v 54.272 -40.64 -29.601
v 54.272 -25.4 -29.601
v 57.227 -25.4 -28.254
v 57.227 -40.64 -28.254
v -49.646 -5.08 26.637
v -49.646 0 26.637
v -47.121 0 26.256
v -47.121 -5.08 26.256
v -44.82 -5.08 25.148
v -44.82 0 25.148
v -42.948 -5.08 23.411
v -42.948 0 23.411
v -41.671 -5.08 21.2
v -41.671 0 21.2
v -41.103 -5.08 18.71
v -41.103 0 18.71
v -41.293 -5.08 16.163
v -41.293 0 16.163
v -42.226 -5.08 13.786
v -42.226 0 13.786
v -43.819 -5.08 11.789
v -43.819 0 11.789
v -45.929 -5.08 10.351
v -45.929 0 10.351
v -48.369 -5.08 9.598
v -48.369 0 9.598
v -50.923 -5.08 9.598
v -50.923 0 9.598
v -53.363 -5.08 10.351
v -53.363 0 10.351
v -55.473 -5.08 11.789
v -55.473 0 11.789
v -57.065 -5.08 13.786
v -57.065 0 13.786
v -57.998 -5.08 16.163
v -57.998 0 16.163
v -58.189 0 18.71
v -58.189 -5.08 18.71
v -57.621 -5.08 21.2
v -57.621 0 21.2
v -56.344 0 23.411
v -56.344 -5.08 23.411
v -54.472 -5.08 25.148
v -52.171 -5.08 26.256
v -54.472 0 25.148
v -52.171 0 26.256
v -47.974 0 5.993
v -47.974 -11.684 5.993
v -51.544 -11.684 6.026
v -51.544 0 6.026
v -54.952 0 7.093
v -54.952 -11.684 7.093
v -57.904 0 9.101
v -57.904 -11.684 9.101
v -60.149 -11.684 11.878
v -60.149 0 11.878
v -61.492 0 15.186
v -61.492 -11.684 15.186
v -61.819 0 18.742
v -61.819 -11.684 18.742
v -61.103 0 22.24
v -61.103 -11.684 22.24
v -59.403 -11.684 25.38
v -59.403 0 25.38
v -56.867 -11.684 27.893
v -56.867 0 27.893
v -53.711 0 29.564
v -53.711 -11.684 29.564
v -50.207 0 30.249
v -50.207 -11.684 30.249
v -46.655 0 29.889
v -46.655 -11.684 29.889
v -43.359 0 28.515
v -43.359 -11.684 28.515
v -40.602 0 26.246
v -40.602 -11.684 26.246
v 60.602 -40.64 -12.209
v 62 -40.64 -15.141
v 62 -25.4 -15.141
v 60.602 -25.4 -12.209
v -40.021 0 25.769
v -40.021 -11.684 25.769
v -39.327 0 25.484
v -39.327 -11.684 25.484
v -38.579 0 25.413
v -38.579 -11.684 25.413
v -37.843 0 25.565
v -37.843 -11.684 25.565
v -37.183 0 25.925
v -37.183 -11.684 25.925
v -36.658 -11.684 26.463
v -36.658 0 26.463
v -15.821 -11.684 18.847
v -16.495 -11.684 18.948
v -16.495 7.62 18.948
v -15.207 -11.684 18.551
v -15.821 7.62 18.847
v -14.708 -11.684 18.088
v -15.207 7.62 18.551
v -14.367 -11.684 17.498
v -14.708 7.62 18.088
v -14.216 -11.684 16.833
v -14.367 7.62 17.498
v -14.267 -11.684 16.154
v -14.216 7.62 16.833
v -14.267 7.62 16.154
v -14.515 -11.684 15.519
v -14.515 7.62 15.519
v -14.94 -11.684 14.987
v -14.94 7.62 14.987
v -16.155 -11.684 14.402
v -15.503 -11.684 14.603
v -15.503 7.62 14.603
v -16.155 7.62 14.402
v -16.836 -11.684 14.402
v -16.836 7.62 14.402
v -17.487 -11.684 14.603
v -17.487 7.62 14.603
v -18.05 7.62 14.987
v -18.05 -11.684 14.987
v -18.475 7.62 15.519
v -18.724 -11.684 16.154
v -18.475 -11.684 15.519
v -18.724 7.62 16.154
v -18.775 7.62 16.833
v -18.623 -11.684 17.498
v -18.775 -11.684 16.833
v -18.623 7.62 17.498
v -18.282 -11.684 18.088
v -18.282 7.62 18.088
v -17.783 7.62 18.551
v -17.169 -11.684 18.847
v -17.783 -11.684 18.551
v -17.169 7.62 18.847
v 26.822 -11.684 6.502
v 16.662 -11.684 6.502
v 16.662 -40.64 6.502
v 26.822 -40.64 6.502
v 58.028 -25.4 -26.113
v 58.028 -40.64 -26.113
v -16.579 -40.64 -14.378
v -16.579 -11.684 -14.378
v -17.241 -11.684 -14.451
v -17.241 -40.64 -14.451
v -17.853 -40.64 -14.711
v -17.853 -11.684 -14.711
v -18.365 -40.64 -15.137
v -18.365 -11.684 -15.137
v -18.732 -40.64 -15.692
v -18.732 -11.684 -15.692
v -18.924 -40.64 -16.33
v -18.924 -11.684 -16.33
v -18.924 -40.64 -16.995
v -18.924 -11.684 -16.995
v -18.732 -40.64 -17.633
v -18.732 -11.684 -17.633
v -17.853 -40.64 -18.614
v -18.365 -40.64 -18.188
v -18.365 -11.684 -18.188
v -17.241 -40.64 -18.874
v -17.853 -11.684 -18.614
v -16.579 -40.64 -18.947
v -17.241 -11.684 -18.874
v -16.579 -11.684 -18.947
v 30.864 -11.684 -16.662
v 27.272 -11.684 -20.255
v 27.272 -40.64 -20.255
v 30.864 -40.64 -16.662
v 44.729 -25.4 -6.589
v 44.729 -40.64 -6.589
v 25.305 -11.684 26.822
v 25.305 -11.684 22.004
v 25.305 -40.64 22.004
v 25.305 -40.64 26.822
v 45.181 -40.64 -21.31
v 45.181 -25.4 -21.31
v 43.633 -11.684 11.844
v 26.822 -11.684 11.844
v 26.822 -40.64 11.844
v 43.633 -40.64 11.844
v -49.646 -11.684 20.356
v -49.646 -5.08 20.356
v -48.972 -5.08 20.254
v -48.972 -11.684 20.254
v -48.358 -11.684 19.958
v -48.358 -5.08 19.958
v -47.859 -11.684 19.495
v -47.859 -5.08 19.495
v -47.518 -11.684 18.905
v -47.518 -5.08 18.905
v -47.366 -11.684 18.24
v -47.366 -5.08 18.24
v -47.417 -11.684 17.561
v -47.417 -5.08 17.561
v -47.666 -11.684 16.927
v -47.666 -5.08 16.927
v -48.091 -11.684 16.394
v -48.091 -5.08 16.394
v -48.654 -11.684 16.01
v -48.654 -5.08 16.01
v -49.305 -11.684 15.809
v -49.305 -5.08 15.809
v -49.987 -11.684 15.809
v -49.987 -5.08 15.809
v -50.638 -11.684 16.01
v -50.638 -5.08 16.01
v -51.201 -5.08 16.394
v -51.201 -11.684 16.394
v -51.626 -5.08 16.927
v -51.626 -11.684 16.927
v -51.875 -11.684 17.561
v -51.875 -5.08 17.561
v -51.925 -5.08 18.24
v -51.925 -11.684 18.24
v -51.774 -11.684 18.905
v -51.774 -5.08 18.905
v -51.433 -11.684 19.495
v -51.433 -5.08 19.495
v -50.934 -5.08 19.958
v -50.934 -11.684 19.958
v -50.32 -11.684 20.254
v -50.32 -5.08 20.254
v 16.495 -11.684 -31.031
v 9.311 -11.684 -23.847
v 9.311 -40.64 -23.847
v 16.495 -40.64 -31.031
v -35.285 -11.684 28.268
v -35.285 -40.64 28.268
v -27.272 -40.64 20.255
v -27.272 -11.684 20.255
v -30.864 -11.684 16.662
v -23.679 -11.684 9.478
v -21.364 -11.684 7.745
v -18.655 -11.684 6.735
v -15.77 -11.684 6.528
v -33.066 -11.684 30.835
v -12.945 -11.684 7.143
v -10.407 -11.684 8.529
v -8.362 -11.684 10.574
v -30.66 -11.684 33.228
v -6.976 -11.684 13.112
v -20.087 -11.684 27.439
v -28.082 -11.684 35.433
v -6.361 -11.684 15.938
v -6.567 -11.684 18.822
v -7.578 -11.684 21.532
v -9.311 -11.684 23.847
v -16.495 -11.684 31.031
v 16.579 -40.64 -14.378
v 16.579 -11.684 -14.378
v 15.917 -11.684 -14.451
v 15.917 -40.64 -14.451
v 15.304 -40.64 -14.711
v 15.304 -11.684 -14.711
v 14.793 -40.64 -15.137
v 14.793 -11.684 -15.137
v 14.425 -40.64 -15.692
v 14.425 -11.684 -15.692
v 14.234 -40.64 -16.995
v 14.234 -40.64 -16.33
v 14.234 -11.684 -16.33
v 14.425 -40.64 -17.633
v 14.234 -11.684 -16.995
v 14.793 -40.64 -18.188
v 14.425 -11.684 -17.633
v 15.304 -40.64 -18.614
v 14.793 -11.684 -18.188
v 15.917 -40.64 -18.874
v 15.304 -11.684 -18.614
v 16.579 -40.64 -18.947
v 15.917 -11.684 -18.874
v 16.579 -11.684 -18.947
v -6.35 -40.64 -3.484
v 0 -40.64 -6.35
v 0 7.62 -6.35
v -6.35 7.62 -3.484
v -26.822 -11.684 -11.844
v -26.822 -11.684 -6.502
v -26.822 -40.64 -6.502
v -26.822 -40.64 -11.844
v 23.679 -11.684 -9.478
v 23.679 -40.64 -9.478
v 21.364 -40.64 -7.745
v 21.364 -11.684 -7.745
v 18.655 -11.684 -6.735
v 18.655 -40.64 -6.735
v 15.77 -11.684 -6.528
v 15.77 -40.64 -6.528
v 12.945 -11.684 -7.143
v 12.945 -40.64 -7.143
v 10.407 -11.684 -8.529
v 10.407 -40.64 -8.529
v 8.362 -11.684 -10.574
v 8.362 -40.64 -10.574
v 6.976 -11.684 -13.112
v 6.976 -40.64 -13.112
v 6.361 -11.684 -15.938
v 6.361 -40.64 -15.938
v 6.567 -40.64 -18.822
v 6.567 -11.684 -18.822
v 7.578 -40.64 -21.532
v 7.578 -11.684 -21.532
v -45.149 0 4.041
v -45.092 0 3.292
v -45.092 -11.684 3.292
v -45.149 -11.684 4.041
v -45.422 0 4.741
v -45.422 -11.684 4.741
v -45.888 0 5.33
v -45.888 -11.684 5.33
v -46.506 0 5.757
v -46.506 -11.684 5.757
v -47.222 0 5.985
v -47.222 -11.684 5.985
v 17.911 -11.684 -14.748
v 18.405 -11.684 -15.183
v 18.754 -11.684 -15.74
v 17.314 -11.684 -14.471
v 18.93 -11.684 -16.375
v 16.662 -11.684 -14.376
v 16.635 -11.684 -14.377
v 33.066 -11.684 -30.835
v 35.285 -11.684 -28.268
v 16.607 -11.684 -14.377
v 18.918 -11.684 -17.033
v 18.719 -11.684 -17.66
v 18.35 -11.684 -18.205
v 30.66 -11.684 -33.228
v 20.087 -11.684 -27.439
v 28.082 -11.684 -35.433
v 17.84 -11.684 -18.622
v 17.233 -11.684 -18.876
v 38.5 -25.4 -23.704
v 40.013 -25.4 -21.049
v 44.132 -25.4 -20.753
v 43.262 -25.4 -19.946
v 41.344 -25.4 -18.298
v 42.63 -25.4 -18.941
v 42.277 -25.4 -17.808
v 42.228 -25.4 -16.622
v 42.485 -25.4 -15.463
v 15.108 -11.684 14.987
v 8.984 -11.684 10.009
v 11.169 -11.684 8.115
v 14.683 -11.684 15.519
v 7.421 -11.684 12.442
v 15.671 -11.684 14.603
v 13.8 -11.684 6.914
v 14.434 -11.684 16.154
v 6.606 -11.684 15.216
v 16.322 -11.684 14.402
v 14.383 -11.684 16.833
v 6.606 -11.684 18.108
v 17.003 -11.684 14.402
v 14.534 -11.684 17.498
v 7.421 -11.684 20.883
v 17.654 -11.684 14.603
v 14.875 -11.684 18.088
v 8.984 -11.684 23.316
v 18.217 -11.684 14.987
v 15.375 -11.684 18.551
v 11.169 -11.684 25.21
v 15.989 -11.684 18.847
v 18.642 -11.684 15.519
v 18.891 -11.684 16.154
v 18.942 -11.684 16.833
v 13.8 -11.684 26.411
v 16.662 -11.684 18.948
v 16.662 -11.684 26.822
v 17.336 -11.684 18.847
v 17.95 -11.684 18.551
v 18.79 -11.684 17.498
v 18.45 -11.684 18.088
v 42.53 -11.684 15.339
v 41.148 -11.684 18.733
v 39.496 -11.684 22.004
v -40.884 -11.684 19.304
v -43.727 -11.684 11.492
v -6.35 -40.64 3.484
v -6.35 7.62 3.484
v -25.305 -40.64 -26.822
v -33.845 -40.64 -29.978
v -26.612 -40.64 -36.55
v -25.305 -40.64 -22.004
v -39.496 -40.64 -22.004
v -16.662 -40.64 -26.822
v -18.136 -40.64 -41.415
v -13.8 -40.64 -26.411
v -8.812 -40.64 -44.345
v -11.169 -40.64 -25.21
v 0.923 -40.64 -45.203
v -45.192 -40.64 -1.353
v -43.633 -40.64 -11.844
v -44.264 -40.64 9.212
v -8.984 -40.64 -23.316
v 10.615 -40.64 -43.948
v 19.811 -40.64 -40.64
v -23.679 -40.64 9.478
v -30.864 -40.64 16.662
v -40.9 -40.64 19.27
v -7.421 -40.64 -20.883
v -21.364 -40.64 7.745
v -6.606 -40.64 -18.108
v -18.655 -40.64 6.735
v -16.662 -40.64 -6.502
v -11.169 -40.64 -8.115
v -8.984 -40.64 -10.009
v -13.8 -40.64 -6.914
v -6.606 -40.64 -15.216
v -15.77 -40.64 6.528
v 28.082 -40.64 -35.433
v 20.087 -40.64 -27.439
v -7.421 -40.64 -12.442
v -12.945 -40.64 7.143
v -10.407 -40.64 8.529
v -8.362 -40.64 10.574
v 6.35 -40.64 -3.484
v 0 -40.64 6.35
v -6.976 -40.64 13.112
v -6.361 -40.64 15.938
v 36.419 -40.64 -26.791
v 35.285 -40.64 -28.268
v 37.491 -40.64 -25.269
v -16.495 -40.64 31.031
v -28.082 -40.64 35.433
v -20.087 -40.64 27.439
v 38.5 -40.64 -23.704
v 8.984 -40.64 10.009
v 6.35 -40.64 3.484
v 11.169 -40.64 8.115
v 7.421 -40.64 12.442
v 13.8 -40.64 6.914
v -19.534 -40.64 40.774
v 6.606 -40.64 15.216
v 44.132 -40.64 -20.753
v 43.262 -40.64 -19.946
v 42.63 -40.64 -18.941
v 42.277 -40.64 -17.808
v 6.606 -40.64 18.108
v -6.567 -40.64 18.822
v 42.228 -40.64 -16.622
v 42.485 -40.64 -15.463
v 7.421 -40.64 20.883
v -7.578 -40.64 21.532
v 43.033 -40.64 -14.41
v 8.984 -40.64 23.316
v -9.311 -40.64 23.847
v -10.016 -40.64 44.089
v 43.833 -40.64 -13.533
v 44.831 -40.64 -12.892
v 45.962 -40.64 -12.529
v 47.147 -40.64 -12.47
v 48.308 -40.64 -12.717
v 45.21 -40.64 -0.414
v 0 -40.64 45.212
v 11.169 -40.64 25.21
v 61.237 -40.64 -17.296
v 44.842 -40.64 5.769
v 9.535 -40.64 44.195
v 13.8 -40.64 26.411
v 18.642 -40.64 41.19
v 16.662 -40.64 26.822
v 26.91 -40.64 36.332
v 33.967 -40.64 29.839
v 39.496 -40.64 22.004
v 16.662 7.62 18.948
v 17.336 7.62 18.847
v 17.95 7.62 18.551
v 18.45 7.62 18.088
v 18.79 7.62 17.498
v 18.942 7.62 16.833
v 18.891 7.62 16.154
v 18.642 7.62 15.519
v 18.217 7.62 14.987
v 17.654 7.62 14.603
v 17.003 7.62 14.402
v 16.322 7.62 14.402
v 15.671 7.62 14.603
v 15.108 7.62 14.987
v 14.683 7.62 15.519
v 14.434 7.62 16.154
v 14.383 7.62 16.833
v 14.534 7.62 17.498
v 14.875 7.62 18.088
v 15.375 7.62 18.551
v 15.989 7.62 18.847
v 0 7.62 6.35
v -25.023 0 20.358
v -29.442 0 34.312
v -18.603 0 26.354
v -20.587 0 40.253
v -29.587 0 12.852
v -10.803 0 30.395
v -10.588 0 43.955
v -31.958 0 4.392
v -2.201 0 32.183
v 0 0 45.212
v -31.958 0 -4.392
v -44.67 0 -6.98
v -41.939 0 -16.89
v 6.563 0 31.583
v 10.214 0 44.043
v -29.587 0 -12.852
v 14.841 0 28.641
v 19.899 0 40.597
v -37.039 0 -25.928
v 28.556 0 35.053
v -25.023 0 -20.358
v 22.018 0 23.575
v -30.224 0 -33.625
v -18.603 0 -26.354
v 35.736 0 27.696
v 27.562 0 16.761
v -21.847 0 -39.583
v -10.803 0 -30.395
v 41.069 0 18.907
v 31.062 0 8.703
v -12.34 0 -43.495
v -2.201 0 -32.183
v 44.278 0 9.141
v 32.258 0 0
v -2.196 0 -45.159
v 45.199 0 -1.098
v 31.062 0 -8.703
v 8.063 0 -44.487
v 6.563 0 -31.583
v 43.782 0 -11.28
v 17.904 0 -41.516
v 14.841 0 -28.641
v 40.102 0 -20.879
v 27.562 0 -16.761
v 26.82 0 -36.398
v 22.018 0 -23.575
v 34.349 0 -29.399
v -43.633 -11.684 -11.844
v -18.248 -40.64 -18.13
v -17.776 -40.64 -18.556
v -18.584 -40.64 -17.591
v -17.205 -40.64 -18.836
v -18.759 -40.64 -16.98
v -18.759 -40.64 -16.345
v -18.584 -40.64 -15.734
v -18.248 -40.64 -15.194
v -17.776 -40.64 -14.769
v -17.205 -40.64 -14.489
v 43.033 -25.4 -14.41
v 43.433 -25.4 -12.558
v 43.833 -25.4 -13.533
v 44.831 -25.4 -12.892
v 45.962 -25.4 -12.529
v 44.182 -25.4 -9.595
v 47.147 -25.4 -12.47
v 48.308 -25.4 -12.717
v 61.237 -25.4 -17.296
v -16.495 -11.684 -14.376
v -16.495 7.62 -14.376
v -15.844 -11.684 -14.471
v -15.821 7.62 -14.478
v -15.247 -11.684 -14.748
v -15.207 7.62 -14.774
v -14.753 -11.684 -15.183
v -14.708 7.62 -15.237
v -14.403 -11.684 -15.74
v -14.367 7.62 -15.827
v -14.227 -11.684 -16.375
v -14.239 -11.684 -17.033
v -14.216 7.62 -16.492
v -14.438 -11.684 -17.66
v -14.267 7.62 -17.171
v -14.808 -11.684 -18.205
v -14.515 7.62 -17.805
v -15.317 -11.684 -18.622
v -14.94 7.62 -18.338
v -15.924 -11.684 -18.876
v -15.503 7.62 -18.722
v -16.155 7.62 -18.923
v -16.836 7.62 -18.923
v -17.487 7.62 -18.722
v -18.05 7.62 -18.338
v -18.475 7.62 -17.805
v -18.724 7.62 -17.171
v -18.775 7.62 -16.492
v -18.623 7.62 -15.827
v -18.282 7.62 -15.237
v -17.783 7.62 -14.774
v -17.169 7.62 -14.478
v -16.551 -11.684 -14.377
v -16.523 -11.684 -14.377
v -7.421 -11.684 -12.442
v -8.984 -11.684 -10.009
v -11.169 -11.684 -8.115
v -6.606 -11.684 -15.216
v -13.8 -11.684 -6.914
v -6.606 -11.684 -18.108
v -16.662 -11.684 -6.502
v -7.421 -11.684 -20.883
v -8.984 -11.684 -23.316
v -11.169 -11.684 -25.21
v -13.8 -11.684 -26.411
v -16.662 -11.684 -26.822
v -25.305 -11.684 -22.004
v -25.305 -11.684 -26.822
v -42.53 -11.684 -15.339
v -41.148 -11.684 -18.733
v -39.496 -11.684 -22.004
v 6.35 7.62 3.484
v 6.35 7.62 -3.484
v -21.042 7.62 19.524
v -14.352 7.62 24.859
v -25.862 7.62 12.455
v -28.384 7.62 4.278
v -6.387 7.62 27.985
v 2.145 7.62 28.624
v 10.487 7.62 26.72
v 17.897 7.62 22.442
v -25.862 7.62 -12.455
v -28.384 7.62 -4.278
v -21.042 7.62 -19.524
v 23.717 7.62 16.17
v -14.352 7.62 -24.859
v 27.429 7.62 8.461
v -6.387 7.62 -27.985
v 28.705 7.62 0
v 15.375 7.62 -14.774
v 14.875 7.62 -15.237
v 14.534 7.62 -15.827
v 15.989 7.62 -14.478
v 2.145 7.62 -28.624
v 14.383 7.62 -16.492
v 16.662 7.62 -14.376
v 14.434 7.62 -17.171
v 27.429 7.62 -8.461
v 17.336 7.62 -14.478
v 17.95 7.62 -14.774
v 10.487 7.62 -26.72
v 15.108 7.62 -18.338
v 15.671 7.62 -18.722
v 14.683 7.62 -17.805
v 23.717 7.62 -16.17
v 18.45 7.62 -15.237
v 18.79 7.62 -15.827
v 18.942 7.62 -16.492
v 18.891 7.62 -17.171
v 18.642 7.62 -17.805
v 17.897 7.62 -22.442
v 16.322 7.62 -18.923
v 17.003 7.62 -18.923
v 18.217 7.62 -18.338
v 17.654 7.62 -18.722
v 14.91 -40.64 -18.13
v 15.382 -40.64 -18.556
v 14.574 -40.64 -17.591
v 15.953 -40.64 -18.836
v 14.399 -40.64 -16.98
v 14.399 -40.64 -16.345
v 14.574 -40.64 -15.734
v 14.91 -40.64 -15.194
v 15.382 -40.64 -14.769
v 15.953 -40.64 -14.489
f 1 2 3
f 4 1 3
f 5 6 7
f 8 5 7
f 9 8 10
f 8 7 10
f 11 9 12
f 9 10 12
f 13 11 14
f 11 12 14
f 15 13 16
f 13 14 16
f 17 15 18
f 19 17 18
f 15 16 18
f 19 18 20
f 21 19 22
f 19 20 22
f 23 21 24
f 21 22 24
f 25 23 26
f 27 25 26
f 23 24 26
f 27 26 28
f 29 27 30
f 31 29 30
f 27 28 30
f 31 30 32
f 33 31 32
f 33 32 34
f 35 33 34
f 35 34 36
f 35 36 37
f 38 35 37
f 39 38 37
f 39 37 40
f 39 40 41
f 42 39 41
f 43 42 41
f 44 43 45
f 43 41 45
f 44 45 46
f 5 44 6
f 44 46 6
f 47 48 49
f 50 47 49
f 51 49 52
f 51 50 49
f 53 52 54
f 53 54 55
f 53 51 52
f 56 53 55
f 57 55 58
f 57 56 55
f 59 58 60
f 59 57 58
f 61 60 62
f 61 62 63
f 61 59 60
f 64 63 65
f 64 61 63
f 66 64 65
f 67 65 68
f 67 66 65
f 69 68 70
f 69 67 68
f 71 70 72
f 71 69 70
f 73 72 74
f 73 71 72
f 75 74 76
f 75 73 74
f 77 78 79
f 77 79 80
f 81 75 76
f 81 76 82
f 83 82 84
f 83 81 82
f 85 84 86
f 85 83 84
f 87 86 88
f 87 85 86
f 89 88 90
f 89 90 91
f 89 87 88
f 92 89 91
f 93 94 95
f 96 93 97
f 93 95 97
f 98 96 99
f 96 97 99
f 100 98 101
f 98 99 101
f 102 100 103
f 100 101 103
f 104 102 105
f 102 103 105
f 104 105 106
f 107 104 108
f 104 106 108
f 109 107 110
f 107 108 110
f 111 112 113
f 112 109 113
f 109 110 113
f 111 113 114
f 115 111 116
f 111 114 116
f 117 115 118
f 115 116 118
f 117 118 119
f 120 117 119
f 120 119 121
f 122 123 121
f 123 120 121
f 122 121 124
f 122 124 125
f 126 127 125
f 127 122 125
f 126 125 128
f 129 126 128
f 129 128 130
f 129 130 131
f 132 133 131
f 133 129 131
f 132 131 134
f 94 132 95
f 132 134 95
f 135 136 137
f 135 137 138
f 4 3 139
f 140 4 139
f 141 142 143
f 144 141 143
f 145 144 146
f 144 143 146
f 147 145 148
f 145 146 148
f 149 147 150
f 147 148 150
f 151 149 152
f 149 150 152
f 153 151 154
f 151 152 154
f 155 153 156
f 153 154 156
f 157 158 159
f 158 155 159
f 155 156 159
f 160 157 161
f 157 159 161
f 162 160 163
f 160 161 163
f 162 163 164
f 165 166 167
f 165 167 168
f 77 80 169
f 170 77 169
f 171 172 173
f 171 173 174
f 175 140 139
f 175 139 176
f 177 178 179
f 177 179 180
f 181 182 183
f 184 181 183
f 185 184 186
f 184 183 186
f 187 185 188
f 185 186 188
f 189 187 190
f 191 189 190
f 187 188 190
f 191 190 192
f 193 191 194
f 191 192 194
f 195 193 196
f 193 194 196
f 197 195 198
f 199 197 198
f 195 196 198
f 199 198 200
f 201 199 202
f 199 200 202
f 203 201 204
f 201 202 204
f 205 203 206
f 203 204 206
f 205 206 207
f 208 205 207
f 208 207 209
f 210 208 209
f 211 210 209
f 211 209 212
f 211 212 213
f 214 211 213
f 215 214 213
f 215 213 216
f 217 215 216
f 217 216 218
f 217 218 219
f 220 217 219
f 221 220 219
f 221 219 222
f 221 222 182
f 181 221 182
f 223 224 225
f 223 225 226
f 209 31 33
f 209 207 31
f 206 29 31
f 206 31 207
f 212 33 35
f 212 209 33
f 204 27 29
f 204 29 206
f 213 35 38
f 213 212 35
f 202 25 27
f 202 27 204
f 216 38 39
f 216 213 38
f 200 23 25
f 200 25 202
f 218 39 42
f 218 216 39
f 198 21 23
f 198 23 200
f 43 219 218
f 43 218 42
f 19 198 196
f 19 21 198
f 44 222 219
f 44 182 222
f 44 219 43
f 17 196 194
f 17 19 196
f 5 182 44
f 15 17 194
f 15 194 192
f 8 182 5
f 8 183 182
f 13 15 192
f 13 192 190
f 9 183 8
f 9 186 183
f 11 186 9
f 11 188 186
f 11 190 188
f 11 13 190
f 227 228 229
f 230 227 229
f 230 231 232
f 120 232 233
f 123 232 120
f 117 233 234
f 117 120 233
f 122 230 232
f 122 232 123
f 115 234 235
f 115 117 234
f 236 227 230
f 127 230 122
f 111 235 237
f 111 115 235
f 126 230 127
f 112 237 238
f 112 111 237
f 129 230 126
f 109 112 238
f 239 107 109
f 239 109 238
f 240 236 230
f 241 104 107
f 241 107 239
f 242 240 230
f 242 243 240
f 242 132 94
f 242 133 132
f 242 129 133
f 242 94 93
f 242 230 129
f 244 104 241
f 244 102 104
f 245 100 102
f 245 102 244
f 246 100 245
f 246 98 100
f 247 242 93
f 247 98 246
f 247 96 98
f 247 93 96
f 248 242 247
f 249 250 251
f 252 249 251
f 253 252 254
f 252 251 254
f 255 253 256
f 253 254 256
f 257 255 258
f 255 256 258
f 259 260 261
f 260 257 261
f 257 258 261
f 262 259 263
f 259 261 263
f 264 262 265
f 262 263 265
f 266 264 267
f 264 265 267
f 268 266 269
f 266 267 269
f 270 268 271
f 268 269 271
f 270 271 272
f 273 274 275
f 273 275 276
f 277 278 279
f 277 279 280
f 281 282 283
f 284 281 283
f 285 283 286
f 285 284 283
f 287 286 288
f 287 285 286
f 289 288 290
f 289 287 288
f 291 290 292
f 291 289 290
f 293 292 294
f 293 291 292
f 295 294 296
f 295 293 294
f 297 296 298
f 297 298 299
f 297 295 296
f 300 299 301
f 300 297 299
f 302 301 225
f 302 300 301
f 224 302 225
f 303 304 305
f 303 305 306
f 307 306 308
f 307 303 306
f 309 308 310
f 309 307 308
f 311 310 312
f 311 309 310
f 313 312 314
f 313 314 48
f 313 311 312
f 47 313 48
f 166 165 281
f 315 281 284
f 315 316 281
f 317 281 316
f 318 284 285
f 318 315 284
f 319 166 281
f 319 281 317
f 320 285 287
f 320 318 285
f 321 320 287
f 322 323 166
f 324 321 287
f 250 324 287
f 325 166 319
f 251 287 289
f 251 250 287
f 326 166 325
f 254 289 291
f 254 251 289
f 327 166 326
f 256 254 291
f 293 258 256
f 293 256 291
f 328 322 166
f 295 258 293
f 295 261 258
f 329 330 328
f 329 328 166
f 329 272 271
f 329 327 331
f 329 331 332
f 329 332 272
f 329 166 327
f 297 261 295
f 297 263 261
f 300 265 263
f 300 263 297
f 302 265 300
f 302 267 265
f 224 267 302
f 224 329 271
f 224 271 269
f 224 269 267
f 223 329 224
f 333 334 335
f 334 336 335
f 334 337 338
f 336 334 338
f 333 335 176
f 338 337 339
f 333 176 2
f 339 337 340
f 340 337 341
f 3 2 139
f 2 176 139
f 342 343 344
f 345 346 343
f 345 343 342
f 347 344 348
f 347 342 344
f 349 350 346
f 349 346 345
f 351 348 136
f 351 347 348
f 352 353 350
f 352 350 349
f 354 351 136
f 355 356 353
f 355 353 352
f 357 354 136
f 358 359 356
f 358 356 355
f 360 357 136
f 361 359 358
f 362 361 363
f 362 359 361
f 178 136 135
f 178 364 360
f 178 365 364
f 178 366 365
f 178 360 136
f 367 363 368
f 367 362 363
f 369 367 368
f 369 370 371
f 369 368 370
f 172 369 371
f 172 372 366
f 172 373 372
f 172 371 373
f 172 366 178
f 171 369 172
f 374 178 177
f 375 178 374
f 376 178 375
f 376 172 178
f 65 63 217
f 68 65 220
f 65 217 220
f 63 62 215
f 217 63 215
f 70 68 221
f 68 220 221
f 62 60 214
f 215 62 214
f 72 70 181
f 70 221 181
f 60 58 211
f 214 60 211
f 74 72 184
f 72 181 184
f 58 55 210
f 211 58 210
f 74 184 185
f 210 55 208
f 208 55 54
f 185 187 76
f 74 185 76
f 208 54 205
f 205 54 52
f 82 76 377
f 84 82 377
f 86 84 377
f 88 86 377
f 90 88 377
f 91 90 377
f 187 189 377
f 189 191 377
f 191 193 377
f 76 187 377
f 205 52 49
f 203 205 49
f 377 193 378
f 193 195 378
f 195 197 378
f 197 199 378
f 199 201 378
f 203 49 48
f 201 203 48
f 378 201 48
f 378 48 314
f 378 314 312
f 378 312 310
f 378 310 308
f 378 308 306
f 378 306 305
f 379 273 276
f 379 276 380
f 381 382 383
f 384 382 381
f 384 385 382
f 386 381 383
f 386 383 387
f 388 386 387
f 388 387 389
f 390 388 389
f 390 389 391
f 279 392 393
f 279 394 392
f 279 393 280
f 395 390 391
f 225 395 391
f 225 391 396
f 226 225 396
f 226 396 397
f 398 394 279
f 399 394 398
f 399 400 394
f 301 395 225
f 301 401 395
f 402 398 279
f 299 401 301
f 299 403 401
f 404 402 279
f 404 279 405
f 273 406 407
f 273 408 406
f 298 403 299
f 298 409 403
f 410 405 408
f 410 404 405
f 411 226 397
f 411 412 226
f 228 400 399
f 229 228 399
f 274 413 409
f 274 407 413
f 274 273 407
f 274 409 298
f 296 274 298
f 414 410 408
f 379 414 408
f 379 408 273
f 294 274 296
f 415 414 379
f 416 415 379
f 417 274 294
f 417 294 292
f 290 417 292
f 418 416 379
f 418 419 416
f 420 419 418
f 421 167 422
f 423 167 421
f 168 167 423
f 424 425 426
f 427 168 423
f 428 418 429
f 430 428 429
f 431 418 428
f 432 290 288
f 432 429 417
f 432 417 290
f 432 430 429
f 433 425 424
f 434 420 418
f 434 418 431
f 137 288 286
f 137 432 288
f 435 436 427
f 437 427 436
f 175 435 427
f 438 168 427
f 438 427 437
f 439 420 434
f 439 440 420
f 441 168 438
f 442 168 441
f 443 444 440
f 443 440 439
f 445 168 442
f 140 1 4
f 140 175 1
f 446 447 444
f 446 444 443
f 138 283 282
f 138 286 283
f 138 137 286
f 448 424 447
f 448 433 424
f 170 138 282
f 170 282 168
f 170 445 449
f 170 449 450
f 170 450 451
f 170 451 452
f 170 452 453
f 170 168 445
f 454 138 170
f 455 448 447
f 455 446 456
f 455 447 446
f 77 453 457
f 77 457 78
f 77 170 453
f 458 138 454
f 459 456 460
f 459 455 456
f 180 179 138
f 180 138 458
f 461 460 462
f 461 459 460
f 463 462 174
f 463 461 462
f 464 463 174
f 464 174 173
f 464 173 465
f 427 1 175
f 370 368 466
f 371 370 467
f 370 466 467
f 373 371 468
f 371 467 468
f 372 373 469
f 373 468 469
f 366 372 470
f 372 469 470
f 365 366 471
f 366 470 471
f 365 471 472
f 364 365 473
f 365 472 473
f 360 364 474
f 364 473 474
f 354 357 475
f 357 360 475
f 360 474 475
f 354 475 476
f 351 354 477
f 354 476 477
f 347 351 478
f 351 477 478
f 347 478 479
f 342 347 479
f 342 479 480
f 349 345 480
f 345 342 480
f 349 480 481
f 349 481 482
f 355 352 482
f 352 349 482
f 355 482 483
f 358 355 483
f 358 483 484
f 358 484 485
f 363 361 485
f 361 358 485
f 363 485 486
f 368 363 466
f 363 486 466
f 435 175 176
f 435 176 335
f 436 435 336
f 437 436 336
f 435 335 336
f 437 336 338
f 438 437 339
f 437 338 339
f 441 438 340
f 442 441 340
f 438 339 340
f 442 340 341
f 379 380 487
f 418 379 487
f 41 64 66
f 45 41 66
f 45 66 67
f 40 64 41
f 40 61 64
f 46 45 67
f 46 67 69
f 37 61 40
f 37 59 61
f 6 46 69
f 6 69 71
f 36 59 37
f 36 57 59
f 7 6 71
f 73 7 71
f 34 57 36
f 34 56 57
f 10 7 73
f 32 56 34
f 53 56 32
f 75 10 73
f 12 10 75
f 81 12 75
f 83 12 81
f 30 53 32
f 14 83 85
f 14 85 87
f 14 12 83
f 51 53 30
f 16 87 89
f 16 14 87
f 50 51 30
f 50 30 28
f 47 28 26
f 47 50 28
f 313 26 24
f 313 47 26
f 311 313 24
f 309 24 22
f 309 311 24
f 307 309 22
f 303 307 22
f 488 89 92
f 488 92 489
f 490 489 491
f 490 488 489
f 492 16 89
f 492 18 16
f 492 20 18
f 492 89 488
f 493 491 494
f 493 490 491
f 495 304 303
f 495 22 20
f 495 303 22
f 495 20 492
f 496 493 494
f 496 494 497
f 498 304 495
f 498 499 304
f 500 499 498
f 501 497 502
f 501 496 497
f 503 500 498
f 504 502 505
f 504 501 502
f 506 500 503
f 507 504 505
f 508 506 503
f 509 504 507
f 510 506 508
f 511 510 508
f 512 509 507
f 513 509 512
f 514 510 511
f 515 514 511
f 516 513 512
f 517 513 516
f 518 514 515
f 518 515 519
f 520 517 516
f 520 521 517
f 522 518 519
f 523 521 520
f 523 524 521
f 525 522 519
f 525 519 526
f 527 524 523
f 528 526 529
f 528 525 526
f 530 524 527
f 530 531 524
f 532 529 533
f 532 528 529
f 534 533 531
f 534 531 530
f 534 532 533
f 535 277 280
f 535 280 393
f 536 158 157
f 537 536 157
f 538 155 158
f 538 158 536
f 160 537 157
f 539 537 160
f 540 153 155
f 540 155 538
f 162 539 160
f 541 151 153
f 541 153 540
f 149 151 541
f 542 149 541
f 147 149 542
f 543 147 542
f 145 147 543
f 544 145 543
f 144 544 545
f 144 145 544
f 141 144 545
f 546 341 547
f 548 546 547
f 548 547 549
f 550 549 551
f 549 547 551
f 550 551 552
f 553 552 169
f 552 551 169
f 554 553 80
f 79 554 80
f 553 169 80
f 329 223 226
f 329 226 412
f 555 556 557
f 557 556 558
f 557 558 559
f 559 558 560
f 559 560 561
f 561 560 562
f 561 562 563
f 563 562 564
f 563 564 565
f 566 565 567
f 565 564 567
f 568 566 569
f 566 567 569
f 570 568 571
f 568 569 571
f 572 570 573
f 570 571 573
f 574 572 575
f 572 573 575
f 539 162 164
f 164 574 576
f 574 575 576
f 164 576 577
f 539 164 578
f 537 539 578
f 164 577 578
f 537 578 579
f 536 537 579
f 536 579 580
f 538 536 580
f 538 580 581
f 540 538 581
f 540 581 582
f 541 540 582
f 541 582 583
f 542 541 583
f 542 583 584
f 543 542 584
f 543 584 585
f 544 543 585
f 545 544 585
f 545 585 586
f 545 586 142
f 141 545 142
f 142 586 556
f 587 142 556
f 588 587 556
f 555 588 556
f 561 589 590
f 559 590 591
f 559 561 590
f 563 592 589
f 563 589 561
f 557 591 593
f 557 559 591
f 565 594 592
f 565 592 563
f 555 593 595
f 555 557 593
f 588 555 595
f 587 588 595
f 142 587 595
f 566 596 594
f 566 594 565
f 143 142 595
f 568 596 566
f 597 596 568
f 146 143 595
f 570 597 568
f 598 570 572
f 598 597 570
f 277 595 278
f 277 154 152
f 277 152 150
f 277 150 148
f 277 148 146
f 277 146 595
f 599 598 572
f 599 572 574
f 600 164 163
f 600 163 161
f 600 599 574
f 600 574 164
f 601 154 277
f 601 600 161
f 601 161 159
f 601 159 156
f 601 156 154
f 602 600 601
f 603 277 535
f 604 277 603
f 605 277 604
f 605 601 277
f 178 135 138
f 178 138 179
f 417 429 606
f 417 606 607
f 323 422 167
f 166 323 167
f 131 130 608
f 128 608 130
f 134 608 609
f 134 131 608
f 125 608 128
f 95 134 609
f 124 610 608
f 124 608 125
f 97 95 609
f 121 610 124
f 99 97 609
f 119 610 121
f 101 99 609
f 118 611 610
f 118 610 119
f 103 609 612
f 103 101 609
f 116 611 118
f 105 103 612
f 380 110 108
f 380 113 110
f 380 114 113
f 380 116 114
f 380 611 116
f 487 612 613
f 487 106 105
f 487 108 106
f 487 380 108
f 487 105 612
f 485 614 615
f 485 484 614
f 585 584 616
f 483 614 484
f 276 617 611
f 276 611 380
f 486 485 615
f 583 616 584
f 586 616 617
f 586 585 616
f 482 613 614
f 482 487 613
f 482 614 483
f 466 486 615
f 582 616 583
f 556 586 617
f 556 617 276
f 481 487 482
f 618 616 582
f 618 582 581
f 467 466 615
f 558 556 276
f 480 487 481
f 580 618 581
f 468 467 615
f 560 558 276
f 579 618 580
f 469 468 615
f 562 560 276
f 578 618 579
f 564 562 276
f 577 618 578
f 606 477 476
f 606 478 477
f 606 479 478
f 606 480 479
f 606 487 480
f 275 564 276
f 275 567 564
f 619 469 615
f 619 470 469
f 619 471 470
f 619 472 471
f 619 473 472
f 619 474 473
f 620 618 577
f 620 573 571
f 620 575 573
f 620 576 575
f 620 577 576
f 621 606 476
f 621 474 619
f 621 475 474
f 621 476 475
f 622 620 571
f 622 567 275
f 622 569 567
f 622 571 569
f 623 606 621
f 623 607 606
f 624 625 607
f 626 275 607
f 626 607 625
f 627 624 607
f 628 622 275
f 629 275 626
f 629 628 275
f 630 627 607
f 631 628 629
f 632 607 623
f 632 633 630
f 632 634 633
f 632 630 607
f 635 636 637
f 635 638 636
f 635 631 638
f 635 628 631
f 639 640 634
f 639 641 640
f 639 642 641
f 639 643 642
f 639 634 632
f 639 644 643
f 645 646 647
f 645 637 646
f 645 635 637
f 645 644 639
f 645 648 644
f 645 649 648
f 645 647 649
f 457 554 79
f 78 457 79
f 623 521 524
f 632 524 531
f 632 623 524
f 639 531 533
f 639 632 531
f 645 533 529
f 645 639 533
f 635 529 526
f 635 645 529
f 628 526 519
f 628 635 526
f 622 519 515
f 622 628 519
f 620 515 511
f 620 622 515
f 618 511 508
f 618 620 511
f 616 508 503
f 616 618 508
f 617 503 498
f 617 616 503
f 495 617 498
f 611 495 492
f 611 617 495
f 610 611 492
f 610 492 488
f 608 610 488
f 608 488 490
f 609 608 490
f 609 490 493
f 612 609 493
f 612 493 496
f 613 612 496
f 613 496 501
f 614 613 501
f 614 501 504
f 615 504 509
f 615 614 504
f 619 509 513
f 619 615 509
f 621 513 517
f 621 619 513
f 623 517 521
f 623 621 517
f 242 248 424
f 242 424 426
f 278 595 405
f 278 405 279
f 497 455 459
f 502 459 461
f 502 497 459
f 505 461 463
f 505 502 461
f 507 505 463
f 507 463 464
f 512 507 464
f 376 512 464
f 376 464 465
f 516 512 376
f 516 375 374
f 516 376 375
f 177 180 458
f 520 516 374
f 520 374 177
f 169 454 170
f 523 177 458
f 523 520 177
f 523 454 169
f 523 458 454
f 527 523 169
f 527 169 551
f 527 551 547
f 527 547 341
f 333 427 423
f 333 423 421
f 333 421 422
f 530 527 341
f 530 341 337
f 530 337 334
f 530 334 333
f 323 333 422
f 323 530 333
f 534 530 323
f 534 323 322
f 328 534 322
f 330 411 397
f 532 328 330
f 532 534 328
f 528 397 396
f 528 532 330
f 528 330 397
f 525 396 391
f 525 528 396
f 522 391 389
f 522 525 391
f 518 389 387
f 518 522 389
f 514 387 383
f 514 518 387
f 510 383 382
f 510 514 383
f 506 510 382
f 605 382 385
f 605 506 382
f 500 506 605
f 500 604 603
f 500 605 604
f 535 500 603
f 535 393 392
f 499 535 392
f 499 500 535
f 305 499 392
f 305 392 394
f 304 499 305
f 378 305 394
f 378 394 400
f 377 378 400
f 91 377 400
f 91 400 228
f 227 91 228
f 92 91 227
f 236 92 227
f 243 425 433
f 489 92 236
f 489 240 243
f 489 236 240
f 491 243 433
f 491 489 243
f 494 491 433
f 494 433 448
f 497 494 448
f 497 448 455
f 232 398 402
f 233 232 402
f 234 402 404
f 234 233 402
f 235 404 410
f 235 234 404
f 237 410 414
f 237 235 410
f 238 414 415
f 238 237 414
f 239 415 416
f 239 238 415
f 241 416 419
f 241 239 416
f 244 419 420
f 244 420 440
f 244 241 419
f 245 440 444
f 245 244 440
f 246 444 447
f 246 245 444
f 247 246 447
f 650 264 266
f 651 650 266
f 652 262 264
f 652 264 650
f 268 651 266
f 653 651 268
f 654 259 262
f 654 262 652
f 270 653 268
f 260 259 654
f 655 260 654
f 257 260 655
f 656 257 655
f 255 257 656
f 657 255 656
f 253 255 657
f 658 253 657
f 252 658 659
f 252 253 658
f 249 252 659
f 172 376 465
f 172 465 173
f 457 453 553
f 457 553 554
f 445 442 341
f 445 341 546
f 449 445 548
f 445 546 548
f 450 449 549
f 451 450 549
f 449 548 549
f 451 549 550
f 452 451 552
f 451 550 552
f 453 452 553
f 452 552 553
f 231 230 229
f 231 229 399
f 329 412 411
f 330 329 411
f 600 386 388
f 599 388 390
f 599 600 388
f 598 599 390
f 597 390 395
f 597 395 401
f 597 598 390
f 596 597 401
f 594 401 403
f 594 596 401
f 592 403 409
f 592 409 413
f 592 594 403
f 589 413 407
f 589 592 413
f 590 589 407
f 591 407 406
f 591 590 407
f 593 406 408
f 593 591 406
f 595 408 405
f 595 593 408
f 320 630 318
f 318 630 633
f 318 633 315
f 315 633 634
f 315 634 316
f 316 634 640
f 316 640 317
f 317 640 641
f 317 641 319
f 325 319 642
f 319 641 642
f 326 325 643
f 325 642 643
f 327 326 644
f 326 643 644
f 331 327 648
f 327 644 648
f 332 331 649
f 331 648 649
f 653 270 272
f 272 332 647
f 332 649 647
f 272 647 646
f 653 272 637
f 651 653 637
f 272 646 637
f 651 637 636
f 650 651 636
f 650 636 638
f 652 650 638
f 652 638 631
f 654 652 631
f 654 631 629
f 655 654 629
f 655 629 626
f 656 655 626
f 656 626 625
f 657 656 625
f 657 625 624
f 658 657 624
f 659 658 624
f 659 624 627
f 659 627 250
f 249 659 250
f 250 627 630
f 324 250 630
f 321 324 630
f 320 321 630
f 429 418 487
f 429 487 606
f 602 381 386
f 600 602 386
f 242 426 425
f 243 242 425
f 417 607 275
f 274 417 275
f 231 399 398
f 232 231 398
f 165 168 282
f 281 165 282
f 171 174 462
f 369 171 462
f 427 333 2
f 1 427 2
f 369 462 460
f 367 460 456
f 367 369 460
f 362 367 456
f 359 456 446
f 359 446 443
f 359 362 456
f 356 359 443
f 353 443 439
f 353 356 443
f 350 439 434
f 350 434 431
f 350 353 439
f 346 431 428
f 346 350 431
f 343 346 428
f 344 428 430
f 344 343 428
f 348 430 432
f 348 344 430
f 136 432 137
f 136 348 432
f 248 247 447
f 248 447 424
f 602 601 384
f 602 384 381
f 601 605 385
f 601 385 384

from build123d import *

# Parameters (mm, degrees)
SKETCH2_R           = 45.212
SKETCH2_R_2         = 32.258
BOSS_EXTRUDE3_DEPTH = 40.64
SKETCH4_R           = 32.258
BOSS_EXTRUDE4_DEPTH = 7.62
BOSS_EXTRUDE4_TAPER = 25
CUT_EXTRUDE1_DEPTH  = 81.10791158
SKETCH7_R           = 2.286
CUT_EXTRUDE2_DEPTH  = 81.107911519
BOSS_EXTRUDE8_START = -7.62
BOSS_EXTRUDE8_DEPTH = 11.684
SKETCH18_R          = 8.567257543
CUT_EXTRUDE3_DEPTH  = 5.08
SKETCH19_R          = 2.286
CUT_EXTRUDE4_DEPTH  = 85.454467418
BOSS_EXTRUDE9_START = -15.24
BOSS_EXTRUDE9_DEPTH = 15.24
CUT_EXTRUDE5_START  = -28.956
SKETCH21_R          = 2.286
CUT_EXTRUDE5_DEPTH  = 28.956
CIRPATTERN1_COUNT   = 2


with BuildPart() as part:
    # Sketch2 → Boss-Extrude3 (new body)
    # profile 1 of 2: a face of its own
    with BuildSketch(Plane(origin=(0, 0, 0), x_dir=(1, 0, 0), z_dir=(0, 1, 0))):
        with Locations(Location((0, 0, 0), (0, 0, 270))):
            Circle(SKETCH2_R)
        Circle(SKETCH2_R_2, mode=Mode.SUBTRACT)
    # profile 2 of 2: a face of its own
    with BuildSketch(Plane(origin=(0, 0, 0), x_dir=(1, 0, 0), z_dir=(0, 1, 0))):
        Circle(SKETCH2_R_2)
        Polygon((0, 6.35), (-6.35, 3.483506942), (-6.35, -3.483506942), (0, -6.35), (6.35, -3.483506942), (6.35, 3.483506942), align=None, mode=Mode.SUBTRACT)
    extrude(amount=-BOSS_EXTRUDE3_DEPTH)

    # Sketch4 → Boss-Extrude4 (add)
    with BuildSketch(Plane(origin=(0, 0, 0), x_dir=(1, 0, 0), z_dir=(0, 1, 0))):
        Circle(SKETCH4_R)
    extrude(amount=BOSS_EXTRUDE4_DEPTH, taper=BOSS_EXTRUDE4_TAPER)

    # Sketch6 → Cut-Extrude1 (cut, through all)
    with BuildSketch(Plane(origin=(0, -40.64, 0), x_dir=(-1, 0, 0), z_dir=(0, -1, 0))):
        Polygon((6.35, -3.483506942), (0, -6.35), (-6.35, -3.483506942), (-6.35, 3.483506942), (0, 6.35), (6.35, 3.483506942), align=None)
    extrude(amount=-CUT_EXTRUDE1_DEPTH, mode=Mode.SUBTRACT)

    # Sketch7 → Cut-Extrude2 (cut, through all)
    with BuildSketch(Plane(origin=(0, 7.62, 0), x_dir=(1, 0, 0), z_dir=(0, 1, 0))):
        with Locations(Location((-16.495222192, 16.6624, 0), (0, 0, 270))):
            Circle(SKETCH7_R)
        with Locations(Location((16.6624, 16.6624, 0), (0, 0, 270))):
            Circle(SKETCH7_R)
        with Locations(Location((16.6624, -16.6624, 0), (0, 0, 270))):
            Circle(SKETCH7_R)
        with Locations(Location((-16.495222192, -16.6624, 0), (0, 0, 270))):
            Circle(SKETCH7_R)
    extrude(amount=-CUT_EXTRUDE2_DEPTH, mode=Mode.SUBTRACT)

    # Sketch12 → Boss-Extrude8 (add)
    with BuildSketch(Plane(origin=(0, 7.62, 0), x_dir=(1, 0, 0), z_dir=(0, 1, 0)).offset(BOSS_EXTRUDE8_START)):
        with BuildLine():
            ThreePointArc((-45.091998917, -3.291895759), (-45.888251869, -5.330050438), (-47.973633707, -5.992829324))
            ThreePointArc((-47.973633707, -5.992829324), (-61.102572974, -22.2395178), (-40.602051954, -26.246083736))
            ThreePointArc((-40.602051954, -26.246083736), (-38.578530729, -25.413344212), (-36.658465006, -26.462839746))
            ThreePointArc((-36.658465006, -26.462839746), (-42.485382771, -15.46341472), (-45.091998917, -3.291895759))
        make_face()
    extrude(amount=-BOSS_EXTRUDE8_DEPTH)

    # Sketch18 → Cut-Extrude3 (cut)
    with BuildSketch(Plane(origin=(0, 0, 0), x_dir=(1, 0, 0), z_dir=(0, 1, 0))):
        with Locations(Location((-49.645840541, -18.069608212, 0), (0, 0, 270))):
            Circle(SKETCH18_R)
    extrude(amount=-CUT_EXTRUDE3_DEPTH, mode=Mode.SUBTRACT)

    # Sketch19 → Cut-Extrude4 (cut, through all)
    with BuildSketch(Plane(origin=(0, -5.08, 0), x_dir=(1, 0, 0), z_dir=(0, 1, 0))):
        with Locations(Location((-49.645840541, -18.069608212, 0), (0, 0, 270))):
            Circle(SKETCH19_R)
    extrude(amount=-CUT_EXTRUDE4_DEPTH, mode=Mode.SUBTRACT)

    # Sketch20 → Boss-Extrude9 (add)
    with BuildSketch(Plane.XZ.offset(40.64).offset(BOSS_EXTRUDE9_START)):
        with BuildLine():
            ThreePointArc((42.485382852, -15.463414497), (44.831385262, -12.89196184), (48.307822394, -12.717373918))
            Line((48.307822394, -12.717373918), (61.237093085, -17.295868799))
            Line((61.237093085, -17.295868799), (62.000175566, -15.140990351))
            Line((62.000175566, -15.140990351), (60.601893265, -12.209430544))
            Line((60.601893265, -12.209430544), (44.72934622, -6.588666841))
            ThreePointArc((44.72934622, -6.588666841), (43.832551012, -11.082978649), (42.485382852, -15.463414497))
        make_face()
        with BuildLine():
            ThreePointArc((45.180509286, -21.309596065), (42.629626793, -18.941243028), (42.485382852, -15.463414497))
            ThreePointArc((42.485382852, -15.463414497), (40.701683588, -19.684966271), (38.499780526, -23.704257918))
            Line((38.499780526, -23.704257918), (54.271814253, -29.601179693))
            Line((54.271814253, -29.601179693), (57.22733096, -28.254273131))
            Line((57.22733096, -28.254273131), (58.027905034, -26.113040506))
            Line((58.027905034, -26.113040506), (45.180509286, -21.309596065))
        make_face()
    extrude(amount=BOSS_EXTRUDE9_DEPTH)

    # Sketch21 → Cut-Extrude5 (cut)
    # profile 1 of 2: a face of its own
    with BuildSketch(Plane.XZ.offset(40.64).offset(CUT_EXTRUDE5_START)):
        with BuildLine():
            Line((-20.08732464, 27.438707345), (-28.082012675, 35.43339538))
            ThreePointArc((-28.082012675, 35.43339538), (-31.885487137, 32.053715136), (-35.285134805, 28.268077504))
            Line((-35.285134805, 28.268077504), (-27.271504992, 20.254502449))
            Line((-27.271504992, 20.254502449), (-30.86360744, 16.662375455))
            Line((-30.86360744, 16.662375455), (-23.679427089, 9.478195103))
            ThreePointArc((-23.679427089, 9.478195103), (-9.311017295, 9.478195103), (-9.311017295, 23.846604897))
            Line((-9.311017295, 23.846604897), (-16.495222192, 31.030809794))
            Line((-16.495222192, 31.030809794), (-20.08732464, 27.438707345))
        make_face()
        with Locations(Location((-16.495222192, 16.6624, 0), (0, 0, 90))):
            Circle(SKETCH21_R, mode=Mode.SUBTRACT)
    # profile 2 of 2: a face of its own
    with BuildSketch(Plane.XZ.offset(40.64).offset(CUT_EXTRUDE5_START)):
        with BuildLine():
            ThreePointArc((16.6624, 26.8224), (6.5024, 16.6624), (16.6624, 6.5024))
            Line((16.6624, 6.5024), (26.8224, 6.5024))
            Line((26.8224, 6.5024), (26.8224, 11.844066963))
            Line((26.8224, 11.844066963), (43.63304965, 11.844066963))
            ThreePointArc((43.63304965, 11.844066963), (41.873887087, 17.050000709), (39.496151472, 22.004066963))
            Line((39.496151472, 22.004066963), (25.304864582, 22.004066963))
            Line((25.304864582, 22.004066963), (25.304864582, 26.8224))
            Line((25.304864582, 26.8224), (16.6624, 26.8224))
        make_face()
        with Locations(Location((16.6624, 16.6624, 0), (0, 0, 90))):
            Circle(SKETCH21_R, mode=Mode.SUBTRACT)
    cut_extrude5 = extrude(amount=CUT_EXTRUDE5_DEPTH, mode=Mode.SUBTRACT)

    # CirPattern1: Cut-Extrude5 ×2 about axis
    cirpattern1_axis = Axis((0, 0, 0), (0, 1, 0))
    for i in range(1, CIRPATTERN1_COUNT):
        add(cut_extrude5.rotate(cirpattern1_axis, i * 360 / CIRPATTERN1_COUNT), mode=Mode.SUBTRACT)


solid = part.part
